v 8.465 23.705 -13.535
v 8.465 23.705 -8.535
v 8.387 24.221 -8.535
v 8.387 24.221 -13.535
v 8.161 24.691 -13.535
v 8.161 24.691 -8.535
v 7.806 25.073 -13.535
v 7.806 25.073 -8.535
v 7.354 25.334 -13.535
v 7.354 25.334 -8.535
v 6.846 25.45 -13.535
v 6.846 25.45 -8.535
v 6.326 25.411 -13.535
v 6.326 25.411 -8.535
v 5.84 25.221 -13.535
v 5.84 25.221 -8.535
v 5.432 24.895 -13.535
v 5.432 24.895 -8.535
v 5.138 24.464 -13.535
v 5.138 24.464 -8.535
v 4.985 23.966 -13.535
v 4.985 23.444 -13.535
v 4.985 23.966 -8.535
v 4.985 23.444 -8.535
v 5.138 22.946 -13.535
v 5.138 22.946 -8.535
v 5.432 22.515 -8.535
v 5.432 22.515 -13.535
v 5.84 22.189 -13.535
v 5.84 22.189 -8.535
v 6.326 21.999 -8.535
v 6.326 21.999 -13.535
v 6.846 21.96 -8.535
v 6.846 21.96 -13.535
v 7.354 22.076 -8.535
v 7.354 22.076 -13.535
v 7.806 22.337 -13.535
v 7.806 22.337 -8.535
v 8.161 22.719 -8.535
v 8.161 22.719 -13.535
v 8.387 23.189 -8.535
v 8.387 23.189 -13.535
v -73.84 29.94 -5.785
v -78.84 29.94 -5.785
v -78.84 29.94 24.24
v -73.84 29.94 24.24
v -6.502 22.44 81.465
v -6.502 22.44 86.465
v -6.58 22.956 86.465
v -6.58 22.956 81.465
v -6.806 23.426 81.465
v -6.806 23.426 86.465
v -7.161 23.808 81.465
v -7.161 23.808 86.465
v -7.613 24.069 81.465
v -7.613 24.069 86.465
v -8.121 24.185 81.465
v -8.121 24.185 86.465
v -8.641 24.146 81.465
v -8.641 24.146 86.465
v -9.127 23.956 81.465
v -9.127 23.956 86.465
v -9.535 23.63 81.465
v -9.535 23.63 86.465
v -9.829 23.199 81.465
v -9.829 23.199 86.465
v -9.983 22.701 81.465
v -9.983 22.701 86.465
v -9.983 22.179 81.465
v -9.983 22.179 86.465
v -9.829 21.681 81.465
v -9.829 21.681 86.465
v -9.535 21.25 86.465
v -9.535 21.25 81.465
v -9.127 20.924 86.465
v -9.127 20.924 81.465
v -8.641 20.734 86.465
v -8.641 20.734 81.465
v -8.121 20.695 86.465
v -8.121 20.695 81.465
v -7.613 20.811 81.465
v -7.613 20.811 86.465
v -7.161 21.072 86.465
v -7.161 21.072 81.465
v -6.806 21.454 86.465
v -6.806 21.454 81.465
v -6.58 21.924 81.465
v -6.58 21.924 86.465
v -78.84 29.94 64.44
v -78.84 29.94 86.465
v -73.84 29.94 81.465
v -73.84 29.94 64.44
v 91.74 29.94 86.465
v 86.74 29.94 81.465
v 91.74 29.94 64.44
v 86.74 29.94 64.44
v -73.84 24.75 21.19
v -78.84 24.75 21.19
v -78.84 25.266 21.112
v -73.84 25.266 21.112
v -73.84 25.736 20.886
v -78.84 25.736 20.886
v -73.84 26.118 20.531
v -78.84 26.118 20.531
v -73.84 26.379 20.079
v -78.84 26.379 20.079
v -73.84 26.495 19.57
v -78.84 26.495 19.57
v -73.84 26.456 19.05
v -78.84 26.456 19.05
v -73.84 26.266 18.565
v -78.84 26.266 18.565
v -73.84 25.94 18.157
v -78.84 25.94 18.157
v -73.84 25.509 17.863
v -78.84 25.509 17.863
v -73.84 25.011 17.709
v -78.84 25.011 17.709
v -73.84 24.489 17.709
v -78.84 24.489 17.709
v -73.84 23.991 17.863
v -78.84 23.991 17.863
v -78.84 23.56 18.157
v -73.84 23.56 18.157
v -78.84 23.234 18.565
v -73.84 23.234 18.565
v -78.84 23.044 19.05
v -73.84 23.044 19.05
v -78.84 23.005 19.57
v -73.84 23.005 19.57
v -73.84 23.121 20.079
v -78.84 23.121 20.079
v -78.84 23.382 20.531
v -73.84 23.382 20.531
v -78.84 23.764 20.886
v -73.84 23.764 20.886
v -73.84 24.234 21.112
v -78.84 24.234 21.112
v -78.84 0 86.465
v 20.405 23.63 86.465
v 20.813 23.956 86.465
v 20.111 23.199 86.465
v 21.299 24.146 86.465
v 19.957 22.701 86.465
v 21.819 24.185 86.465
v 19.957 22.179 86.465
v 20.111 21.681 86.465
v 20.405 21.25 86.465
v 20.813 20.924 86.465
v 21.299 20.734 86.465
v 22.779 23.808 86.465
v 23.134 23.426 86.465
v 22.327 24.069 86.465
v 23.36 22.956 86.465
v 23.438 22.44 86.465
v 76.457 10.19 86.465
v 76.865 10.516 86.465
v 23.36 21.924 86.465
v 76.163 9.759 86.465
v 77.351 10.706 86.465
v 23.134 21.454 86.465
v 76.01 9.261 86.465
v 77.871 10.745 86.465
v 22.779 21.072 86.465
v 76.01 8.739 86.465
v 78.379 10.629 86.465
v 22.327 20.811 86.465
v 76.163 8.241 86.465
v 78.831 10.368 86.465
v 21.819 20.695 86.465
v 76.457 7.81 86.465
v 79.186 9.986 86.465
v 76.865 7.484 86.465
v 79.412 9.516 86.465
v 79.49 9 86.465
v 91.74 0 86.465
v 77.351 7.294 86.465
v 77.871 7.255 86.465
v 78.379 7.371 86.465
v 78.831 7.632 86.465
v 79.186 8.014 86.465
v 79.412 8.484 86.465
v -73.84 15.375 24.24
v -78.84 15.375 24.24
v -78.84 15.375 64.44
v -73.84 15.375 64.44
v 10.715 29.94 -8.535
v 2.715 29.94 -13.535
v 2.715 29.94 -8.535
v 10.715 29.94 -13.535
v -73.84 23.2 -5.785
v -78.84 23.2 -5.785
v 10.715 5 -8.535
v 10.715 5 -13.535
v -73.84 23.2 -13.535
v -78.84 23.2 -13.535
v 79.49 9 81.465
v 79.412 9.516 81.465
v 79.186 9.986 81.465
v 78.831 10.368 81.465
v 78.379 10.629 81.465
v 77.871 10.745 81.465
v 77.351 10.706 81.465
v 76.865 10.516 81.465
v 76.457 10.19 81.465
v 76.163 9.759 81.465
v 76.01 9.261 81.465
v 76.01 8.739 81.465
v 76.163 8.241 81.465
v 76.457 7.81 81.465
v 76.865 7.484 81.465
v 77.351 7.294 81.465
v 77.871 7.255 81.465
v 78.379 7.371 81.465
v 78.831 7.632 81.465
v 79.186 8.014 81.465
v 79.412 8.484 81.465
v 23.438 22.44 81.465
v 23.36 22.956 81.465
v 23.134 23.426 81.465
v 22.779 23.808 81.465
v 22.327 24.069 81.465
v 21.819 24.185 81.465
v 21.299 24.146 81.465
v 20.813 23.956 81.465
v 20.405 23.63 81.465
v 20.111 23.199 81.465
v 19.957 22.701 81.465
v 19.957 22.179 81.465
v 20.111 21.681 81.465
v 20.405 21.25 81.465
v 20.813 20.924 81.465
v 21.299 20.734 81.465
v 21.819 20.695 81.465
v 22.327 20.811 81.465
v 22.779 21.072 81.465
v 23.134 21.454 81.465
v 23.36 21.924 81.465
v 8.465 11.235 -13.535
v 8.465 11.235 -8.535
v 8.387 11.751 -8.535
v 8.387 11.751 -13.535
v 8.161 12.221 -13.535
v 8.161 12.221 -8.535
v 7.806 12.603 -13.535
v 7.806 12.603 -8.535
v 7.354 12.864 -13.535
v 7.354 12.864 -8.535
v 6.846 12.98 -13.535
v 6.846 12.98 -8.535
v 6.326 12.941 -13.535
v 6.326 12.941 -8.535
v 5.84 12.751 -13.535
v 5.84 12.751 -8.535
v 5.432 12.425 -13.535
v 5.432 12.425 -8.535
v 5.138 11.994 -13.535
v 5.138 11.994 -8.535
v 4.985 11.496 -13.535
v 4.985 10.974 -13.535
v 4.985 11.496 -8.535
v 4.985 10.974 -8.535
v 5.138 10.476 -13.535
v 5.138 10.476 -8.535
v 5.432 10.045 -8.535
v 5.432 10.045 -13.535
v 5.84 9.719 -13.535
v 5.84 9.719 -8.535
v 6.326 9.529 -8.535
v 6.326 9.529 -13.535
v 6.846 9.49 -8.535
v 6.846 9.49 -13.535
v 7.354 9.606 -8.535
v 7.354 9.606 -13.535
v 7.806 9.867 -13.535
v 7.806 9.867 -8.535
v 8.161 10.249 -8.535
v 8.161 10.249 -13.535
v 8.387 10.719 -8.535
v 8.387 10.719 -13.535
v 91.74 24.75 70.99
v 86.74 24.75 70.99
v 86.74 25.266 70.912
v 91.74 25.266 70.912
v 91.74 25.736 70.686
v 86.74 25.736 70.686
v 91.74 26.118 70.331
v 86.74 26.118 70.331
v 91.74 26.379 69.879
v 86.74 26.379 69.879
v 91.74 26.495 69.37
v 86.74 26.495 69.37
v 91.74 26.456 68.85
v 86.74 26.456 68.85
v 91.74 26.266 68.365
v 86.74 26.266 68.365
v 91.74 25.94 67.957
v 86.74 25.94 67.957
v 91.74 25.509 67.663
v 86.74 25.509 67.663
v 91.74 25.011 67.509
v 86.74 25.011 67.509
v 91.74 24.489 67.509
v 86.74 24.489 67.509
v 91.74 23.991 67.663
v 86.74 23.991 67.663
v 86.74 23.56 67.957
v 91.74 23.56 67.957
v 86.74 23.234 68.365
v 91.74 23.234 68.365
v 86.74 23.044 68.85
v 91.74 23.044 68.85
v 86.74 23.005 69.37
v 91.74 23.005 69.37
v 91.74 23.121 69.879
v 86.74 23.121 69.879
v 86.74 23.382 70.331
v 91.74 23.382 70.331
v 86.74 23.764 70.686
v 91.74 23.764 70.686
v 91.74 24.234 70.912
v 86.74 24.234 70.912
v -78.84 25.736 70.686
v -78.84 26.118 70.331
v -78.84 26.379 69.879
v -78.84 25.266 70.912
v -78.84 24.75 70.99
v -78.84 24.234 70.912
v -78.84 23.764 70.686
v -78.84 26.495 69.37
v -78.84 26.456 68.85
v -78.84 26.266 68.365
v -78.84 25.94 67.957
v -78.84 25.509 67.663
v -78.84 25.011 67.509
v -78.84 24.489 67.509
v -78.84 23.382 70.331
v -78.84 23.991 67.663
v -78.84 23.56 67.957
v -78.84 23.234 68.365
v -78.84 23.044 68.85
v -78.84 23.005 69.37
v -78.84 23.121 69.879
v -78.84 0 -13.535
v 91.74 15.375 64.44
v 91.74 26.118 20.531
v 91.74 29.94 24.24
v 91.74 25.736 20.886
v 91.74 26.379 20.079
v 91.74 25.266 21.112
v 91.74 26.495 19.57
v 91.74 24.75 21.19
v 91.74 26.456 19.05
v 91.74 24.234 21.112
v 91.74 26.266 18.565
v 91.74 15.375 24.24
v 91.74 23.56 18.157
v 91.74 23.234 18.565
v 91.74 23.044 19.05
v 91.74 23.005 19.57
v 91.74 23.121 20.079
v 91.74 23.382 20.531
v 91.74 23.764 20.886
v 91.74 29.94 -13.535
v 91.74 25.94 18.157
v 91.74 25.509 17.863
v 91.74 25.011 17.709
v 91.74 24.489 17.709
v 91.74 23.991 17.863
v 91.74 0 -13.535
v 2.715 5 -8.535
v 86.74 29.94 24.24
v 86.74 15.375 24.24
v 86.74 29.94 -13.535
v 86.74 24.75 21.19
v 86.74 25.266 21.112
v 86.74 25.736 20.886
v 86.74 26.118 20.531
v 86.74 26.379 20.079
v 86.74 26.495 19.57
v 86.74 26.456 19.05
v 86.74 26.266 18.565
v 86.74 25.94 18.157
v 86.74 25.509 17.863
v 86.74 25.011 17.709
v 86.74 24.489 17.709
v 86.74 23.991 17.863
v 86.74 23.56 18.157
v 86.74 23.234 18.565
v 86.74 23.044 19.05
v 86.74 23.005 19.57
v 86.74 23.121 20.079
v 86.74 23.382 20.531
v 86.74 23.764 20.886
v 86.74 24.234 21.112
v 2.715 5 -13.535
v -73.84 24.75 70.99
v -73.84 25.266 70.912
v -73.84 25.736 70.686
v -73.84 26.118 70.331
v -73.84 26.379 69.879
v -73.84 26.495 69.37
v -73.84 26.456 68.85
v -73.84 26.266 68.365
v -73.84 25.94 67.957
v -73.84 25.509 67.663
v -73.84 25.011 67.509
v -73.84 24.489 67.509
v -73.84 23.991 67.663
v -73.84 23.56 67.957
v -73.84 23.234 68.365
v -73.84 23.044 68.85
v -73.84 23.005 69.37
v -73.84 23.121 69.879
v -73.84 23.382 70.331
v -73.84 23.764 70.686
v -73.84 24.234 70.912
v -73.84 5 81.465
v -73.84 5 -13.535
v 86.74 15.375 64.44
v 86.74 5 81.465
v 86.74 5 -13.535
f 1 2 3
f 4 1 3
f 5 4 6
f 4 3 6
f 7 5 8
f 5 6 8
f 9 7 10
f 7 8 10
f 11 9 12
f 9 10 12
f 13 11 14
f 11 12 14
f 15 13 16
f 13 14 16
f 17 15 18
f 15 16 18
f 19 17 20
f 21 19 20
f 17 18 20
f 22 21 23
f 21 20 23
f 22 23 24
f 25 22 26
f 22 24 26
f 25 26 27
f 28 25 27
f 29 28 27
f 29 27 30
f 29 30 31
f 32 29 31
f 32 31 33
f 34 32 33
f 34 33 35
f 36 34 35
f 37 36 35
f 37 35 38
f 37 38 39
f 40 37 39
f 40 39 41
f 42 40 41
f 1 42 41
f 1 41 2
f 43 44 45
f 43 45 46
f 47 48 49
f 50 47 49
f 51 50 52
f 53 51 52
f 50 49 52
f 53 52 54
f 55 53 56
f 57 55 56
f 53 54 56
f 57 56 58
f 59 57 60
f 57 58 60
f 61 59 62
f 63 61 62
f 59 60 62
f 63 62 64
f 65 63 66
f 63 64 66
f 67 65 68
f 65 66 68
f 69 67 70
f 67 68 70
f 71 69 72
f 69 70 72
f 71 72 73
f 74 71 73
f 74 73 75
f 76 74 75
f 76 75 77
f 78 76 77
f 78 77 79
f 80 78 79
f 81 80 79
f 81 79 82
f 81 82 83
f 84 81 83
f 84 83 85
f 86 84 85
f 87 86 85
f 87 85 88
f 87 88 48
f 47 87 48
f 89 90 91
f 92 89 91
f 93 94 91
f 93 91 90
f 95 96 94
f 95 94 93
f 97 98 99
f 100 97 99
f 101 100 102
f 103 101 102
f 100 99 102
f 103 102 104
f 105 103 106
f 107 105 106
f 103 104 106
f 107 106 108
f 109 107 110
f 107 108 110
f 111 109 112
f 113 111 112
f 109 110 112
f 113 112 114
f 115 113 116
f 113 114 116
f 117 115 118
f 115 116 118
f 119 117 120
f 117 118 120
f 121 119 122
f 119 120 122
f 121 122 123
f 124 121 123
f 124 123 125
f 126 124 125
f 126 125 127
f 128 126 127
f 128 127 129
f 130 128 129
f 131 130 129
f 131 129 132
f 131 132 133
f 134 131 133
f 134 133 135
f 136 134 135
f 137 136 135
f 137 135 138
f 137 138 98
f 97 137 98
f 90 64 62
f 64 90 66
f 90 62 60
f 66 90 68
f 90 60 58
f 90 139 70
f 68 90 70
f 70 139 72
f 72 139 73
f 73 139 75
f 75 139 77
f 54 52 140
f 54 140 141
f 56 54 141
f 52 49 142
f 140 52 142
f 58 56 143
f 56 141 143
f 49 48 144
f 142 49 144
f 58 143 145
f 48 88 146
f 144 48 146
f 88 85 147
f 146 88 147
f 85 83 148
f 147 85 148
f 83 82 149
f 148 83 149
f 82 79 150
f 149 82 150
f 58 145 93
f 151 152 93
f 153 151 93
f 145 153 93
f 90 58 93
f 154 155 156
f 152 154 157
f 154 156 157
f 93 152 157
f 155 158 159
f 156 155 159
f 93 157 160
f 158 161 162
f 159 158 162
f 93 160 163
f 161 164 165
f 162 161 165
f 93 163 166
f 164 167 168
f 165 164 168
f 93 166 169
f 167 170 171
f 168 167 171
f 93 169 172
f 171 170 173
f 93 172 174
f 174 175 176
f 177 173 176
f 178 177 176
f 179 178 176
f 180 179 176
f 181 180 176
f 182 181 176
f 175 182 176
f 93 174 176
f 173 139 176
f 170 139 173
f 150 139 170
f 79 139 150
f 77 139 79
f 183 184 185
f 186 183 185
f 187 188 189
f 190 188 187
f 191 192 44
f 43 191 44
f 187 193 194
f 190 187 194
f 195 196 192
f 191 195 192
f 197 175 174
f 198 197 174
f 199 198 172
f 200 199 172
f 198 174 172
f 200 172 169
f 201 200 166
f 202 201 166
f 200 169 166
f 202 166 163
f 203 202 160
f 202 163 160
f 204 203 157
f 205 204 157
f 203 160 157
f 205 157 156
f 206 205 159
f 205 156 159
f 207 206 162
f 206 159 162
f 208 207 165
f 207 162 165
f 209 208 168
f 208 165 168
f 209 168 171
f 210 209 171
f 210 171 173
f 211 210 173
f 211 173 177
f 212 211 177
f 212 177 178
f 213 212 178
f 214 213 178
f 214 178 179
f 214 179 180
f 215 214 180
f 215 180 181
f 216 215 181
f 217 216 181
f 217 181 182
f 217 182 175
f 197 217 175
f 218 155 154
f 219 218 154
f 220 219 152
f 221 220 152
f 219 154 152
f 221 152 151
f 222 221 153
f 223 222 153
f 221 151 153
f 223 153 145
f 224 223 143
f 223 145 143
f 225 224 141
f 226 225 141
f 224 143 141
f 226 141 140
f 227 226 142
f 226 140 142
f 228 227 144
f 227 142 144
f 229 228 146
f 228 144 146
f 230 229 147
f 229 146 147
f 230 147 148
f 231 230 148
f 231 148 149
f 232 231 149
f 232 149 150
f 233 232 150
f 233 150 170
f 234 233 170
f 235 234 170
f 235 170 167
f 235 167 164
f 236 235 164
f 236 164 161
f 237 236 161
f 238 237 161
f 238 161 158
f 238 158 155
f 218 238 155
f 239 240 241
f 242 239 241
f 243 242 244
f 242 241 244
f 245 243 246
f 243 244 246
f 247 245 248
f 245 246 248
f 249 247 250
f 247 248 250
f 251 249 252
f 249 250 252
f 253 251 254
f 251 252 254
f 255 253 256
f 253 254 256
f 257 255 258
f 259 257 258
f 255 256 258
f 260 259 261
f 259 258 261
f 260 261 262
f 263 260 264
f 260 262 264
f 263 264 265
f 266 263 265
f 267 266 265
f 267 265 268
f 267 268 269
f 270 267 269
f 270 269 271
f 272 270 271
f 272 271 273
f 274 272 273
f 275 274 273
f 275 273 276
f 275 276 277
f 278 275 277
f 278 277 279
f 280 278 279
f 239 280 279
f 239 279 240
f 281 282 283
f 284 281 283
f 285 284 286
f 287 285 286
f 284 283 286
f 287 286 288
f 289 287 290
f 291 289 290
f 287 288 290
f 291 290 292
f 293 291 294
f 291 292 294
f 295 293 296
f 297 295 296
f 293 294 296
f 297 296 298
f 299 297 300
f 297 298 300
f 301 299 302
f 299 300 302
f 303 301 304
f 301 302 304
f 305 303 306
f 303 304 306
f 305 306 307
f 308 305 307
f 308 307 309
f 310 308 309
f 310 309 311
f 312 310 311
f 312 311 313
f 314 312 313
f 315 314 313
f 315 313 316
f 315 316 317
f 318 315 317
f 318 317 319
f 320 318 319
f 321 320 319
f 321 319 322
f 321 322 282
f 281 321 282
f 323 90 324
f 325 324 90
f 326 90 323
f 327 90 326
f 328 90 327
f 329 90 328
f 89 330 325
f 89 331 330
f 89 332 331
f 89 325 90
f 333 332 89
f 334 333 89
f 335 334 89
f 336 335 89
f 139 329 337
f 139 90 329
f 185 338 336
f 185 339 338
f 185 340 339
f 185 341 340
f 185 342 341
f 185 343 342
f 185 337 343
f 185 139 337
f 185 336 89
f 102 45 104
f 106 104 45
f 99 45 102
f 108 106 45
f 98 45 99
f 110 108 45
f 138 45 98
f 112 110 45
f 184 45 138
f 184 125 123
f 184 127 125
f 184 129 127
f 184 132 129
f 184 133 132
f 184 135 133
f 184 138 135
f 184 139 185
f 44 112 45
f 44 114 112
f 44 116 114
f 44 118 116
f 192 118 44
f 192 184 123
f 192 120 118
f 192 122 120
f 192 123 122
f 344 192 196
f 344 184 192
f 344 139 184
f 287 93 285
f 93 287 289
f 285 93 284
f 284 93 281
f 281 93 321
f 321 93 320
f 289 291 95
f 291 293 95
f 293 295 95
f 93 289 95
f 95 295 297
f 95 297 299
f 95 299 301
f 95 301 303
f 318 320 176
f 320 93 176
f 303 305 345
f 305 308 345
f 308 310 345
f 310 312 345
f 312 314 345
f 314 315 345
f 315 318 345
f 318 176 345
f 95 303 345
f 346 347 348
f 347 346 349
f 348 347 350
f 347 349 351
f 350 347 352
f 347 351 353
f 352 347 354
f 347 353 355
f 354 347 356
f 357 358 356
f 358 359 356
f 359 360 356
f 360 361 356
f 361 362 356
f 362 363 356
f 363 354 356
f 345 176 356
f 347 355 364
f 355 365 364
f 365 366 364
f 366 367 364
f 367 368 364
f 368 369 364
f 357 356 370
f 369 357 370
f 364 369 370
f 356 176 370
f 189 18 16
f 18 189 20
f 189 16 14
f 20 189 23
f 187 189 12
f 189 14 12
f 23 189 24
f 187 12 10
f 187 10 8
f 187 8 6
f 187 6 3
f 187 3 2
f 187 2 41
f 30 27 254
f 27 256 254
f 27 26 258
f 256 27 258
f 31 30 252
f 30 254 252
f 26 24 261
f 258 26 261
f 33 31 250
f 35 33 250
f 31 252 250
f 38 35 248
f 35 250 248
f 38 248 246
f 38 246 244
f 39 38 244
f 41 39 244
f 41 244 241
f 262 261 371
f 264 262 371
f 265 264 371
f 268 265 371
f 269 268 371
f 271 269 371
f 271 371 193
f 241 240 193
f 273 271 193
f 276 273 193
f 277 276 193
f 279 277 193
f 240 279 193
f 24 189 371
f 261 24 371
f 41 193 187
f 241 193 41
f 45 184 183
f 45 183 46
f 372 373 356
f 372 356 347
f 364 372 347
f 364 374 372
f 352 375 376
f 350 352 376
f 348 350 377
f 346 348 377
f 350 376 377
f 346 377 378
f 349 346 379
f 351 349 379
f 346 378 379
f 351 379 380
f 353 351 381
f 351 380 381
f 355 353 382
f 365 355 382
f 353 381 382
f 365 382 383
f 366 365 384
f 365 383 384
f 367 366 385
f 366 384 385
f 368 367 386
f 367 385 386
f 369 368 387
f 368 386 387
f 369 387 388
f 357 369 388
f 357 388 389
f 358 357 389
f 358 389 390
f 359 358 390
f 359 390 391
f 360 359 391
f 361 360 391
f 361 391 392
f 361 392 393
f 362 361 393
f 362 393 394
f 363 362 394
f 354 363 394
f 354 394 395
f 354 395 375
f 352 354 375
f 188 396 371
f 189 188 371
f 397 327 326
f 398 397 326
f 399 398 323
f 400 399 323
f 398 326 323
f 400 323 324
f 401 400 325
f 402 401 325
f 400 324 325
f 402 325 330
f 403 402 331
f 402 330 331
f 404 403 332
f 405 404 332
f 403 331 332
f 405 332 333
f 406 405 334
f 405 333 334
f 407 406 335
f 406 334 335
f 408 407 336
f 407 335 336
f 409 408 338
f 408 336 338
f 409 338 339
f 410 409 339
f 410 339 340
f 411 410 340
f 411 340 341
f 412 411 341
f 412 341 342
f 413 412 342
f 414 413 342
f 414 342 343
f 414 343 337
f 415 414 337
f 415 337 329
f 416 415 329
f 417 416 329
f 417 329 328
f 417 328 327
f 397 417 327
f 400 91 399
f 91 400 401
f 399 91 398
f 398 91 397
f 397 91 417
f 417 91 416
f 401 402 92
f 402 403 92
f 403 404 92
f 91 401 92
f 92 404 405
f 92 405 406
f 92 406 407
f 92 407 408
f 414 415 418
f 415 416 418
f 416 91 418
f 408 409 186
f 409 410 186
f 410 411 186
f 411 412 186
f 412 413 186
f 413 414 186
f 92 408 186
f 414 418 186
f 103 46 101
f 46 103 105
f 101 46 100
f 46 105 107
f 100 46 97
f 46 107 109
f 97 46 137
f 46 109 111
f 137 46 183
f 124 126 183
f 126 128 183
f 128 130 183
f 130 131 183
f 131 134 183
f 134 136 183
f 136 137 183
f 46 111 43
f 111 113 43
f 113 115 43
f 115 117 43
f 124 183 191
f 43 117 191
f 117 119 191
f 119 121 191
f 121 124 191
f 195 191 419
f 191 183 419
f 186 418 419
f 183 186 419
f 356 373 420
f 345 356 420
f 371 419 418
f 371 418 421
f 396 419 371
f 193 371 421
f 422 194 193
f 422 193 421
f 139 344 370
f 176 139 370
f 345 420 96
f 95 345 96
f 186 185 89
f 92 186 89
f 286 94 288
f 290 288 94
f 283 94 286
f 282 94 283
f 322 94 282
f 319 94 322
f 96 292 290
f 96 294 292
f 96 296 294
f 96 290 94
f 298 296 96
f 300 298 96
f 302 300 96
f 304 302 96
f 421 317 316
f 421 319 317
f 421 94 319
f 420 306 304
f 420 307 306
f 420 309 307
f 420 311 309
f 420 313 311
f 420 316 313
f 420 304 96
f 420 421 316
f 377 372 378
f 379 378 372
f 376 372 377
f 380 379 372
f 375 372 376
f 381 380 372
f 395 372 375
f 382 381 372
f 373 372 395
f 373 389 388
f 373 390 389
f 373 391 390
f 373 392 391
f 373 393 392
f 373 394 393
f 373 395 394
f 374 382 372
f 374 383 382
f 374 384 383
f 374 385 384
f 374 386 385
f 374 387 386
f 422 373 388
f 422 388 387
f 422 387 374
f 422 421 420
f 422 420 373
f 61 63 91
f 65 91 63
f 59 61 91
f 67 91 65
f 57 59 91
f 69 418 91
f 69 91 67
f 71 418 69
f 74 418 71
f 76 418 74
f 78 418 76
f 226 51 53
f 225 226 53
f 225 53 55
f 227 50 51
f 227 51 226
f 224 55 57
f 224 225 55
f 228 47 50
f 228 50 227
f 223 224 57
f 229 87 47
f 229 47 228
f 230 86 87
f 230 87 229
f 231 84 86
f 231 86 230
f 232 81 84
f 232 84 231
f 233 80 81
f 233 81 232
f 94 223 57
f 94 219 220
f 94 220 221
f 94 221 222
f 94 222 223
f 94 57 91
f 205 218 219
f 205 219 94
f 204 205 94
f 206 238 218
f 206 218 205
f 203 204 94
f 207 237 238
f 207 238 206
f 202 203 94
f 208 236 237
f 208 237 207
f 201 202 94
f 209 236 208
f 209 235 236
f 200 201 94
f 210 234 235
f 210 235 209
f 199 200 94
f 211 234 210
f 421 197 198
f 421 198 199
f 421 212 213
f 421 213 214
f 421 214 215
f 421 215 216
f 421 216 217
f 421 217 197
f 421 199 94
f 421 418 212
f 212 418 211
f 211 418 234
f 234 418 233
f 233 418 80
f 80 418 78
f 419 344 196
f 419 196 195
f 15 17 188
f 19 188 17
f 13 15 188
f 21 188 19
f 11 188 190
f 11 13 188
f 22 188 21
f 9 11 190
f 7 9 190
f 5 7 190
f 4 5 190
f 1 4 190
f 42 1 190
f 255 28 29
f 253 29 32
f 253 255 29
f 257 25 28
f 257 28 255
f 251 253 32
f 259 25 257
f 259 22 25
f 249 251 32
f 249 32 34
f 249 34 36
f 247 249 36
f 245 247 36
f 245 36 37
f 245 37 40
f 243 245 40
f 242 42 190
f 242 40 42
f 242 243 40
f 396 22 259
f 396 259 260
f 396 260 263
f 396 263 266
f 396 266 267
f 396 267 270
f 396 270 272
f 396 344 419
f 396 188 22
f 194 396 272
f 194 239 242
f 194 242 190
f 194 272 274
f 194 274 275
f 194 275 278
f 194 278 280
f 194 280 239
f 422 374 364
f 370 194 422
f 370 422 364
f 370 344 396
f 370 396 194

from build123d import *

# Parameters (mm, degrees)
SKETCH3_W           = 170.58
SKETCH3_H           = 100
BOSS_EXTRUDE1_DEPTH = 5
SKETCH4_W           = 5
SKETCH4_H           = 100
BOSS_EXTRUDE2_DEPTH = 24.94
SKETCH6_W           = 160.58
SKETCH6_H           = 5
BOSS_EXTRUDE3_DEPTH = 24.94
BOSS_EXTRUDE4_DEPTH = 24.94
SKETCH8_R           = 1.75
CUT_EXTRUDE1_DEPTH  = 8
SKETCH9_W           = 7.75
SKETCH9_H           = 6.74
CUT_EXTRUDE2_DEPTH  = 10
SKETCH12_W          = 40.2
SKETCH12_H          = 14.565
CUT_EXTRUDE4_DEPTH  = 200
SKETCH13_R          = 1.75
CUT_EXTRUDE5_DEPTH  = 200
SKETCH14_R          = 1.75
CUT_EXTRUDE6_DEPTH  = 10


with BuildPart() as part:
    # Sketch3 → Boss-Extrude1 (new body)
    with BuildSketch(Plane(origin=(0, 0, 0), x_dir=(1, 0, 0), z_dir=(0, 1, 0))):
        with Locations((6.45008576, -36.464595487)):
            Rectangle(SKETCH3_W, SKETCH3_H)
    extrude(amount=BOSS_EXTRUDE1_DEPTH)

    # Sketch4 → Boss-Extrude2 (add)
    with BuildSketch(Plane(origin=(0, 5, 0), x_dir=(1, 0, 0), z_dir=(0, 1, 0))):
        with Locations((89.24008576, -36.464595487)):
            Rectangle(SKETCH4_W, SKETCH4_H)
        with Locations((-76.33991424, -36.464595487)):
            Rectangle(SKETCH4_W, SKETCH4_H)
    extrude(amount=BOSS_EXTRUDE2_DEPTH)

    # Sketch6 → Boss-Extrude3 (add)
    with BuildSketch(Plane(origin=(0, 5, 0), x_dir=(1, 0, 0), z_dir=(0, 1, 0))):
        with Locations((6.45008576, -83.964595487)):
            Rectangle(SKETCH6_W, SKETCH6_H)
    extrude(amount=BOSS_EXTRUDE3_DEPTH)

    # Sketch7 → Boss-Extrude4 (add)
    with BuildSketch(Plane(origin=(0, 5, 0), x_dir=(1, 0, 0), z_dir=(0, 1, 0))):
        Polygon((6.45008576, 13.535404513), (2.715085759, 13.535404513), (2.715085759, 8.535404513), (10.715085759, 8.535404513), (10.715085759, 13.535404513), align=None)
    extrude(amount=BOSS_EXTRUDE4_DEPTH)

    # Sketch8 → Cut-Extrude1 (cut)
    with BuildSketch(Plane.XY.offset(-8.535404513)):
        with Locations((6.715085759, 11.235)):
            Circle(SKETCH8_R)
        with Locations((6.715085759, 23.705)):
            Circle(SKETCH8_R)
    extrude(amount=-CUT_EXTRUDE1_DEPTH, mode=Mode.SUBTRACT)

    # Sketch9 → Cut-Extrude2 (cut)
    with BuildSketch(Plane.ZY.offset(78.83991424)):
        with Locations((-9.660404513, 26.57)):
            Rectangle(SKETCH9_W, SKETCH9_H)
    extrude(amount=-CUT_EXTRUDE2_DEPTH, mode=Mode.SUBTRACT)

    # Sketch12 → Cut-Extrude4 (cut)
    with BuildSketch(Plane.ZY.offset(78.83991424)):
        with Locations((44.339595487, 22.6575)):
            Rectangle(SKETCH12_W, SKETCH12_H)
    extrude(amount=-CUT_EXTRUDE4_DEPTH, mode=Mode.SUBTRACT)

    # Sketch13 → Cut-Extrude5 (cut)
    with BuildSketch(Plane.ZY.offset(78.83991424)):
        with Locations((69.23959554, 24.75)):
            Circle(SKETCH13_R)
        with Locations((19.43959554, 24.75)):
            Circle(SKETCH13_R)
    extrude(amount=-CUT_EXTRUDE5_DEPTH, mode=Mode.SUBTRACT)

    # Sketch14 → Cut-Extrude6 (cut)
    with BuildSketch(Plane.XY.offset(86.464595487)):
        with Locations((21.687920531, 22.44)):
            Circle(SKETCH14_R)
        with Locations((-8.252079469, 22.44)):
            Circle(SKETCH14_R)
        with Locations((77.74008576, 9)):
            Circle(SKETCH14_R)
    extrude(amount=-CUT_EXTRUDE6_DEPTH, mode=Mode.SUBTRACT)


solid = part.part
